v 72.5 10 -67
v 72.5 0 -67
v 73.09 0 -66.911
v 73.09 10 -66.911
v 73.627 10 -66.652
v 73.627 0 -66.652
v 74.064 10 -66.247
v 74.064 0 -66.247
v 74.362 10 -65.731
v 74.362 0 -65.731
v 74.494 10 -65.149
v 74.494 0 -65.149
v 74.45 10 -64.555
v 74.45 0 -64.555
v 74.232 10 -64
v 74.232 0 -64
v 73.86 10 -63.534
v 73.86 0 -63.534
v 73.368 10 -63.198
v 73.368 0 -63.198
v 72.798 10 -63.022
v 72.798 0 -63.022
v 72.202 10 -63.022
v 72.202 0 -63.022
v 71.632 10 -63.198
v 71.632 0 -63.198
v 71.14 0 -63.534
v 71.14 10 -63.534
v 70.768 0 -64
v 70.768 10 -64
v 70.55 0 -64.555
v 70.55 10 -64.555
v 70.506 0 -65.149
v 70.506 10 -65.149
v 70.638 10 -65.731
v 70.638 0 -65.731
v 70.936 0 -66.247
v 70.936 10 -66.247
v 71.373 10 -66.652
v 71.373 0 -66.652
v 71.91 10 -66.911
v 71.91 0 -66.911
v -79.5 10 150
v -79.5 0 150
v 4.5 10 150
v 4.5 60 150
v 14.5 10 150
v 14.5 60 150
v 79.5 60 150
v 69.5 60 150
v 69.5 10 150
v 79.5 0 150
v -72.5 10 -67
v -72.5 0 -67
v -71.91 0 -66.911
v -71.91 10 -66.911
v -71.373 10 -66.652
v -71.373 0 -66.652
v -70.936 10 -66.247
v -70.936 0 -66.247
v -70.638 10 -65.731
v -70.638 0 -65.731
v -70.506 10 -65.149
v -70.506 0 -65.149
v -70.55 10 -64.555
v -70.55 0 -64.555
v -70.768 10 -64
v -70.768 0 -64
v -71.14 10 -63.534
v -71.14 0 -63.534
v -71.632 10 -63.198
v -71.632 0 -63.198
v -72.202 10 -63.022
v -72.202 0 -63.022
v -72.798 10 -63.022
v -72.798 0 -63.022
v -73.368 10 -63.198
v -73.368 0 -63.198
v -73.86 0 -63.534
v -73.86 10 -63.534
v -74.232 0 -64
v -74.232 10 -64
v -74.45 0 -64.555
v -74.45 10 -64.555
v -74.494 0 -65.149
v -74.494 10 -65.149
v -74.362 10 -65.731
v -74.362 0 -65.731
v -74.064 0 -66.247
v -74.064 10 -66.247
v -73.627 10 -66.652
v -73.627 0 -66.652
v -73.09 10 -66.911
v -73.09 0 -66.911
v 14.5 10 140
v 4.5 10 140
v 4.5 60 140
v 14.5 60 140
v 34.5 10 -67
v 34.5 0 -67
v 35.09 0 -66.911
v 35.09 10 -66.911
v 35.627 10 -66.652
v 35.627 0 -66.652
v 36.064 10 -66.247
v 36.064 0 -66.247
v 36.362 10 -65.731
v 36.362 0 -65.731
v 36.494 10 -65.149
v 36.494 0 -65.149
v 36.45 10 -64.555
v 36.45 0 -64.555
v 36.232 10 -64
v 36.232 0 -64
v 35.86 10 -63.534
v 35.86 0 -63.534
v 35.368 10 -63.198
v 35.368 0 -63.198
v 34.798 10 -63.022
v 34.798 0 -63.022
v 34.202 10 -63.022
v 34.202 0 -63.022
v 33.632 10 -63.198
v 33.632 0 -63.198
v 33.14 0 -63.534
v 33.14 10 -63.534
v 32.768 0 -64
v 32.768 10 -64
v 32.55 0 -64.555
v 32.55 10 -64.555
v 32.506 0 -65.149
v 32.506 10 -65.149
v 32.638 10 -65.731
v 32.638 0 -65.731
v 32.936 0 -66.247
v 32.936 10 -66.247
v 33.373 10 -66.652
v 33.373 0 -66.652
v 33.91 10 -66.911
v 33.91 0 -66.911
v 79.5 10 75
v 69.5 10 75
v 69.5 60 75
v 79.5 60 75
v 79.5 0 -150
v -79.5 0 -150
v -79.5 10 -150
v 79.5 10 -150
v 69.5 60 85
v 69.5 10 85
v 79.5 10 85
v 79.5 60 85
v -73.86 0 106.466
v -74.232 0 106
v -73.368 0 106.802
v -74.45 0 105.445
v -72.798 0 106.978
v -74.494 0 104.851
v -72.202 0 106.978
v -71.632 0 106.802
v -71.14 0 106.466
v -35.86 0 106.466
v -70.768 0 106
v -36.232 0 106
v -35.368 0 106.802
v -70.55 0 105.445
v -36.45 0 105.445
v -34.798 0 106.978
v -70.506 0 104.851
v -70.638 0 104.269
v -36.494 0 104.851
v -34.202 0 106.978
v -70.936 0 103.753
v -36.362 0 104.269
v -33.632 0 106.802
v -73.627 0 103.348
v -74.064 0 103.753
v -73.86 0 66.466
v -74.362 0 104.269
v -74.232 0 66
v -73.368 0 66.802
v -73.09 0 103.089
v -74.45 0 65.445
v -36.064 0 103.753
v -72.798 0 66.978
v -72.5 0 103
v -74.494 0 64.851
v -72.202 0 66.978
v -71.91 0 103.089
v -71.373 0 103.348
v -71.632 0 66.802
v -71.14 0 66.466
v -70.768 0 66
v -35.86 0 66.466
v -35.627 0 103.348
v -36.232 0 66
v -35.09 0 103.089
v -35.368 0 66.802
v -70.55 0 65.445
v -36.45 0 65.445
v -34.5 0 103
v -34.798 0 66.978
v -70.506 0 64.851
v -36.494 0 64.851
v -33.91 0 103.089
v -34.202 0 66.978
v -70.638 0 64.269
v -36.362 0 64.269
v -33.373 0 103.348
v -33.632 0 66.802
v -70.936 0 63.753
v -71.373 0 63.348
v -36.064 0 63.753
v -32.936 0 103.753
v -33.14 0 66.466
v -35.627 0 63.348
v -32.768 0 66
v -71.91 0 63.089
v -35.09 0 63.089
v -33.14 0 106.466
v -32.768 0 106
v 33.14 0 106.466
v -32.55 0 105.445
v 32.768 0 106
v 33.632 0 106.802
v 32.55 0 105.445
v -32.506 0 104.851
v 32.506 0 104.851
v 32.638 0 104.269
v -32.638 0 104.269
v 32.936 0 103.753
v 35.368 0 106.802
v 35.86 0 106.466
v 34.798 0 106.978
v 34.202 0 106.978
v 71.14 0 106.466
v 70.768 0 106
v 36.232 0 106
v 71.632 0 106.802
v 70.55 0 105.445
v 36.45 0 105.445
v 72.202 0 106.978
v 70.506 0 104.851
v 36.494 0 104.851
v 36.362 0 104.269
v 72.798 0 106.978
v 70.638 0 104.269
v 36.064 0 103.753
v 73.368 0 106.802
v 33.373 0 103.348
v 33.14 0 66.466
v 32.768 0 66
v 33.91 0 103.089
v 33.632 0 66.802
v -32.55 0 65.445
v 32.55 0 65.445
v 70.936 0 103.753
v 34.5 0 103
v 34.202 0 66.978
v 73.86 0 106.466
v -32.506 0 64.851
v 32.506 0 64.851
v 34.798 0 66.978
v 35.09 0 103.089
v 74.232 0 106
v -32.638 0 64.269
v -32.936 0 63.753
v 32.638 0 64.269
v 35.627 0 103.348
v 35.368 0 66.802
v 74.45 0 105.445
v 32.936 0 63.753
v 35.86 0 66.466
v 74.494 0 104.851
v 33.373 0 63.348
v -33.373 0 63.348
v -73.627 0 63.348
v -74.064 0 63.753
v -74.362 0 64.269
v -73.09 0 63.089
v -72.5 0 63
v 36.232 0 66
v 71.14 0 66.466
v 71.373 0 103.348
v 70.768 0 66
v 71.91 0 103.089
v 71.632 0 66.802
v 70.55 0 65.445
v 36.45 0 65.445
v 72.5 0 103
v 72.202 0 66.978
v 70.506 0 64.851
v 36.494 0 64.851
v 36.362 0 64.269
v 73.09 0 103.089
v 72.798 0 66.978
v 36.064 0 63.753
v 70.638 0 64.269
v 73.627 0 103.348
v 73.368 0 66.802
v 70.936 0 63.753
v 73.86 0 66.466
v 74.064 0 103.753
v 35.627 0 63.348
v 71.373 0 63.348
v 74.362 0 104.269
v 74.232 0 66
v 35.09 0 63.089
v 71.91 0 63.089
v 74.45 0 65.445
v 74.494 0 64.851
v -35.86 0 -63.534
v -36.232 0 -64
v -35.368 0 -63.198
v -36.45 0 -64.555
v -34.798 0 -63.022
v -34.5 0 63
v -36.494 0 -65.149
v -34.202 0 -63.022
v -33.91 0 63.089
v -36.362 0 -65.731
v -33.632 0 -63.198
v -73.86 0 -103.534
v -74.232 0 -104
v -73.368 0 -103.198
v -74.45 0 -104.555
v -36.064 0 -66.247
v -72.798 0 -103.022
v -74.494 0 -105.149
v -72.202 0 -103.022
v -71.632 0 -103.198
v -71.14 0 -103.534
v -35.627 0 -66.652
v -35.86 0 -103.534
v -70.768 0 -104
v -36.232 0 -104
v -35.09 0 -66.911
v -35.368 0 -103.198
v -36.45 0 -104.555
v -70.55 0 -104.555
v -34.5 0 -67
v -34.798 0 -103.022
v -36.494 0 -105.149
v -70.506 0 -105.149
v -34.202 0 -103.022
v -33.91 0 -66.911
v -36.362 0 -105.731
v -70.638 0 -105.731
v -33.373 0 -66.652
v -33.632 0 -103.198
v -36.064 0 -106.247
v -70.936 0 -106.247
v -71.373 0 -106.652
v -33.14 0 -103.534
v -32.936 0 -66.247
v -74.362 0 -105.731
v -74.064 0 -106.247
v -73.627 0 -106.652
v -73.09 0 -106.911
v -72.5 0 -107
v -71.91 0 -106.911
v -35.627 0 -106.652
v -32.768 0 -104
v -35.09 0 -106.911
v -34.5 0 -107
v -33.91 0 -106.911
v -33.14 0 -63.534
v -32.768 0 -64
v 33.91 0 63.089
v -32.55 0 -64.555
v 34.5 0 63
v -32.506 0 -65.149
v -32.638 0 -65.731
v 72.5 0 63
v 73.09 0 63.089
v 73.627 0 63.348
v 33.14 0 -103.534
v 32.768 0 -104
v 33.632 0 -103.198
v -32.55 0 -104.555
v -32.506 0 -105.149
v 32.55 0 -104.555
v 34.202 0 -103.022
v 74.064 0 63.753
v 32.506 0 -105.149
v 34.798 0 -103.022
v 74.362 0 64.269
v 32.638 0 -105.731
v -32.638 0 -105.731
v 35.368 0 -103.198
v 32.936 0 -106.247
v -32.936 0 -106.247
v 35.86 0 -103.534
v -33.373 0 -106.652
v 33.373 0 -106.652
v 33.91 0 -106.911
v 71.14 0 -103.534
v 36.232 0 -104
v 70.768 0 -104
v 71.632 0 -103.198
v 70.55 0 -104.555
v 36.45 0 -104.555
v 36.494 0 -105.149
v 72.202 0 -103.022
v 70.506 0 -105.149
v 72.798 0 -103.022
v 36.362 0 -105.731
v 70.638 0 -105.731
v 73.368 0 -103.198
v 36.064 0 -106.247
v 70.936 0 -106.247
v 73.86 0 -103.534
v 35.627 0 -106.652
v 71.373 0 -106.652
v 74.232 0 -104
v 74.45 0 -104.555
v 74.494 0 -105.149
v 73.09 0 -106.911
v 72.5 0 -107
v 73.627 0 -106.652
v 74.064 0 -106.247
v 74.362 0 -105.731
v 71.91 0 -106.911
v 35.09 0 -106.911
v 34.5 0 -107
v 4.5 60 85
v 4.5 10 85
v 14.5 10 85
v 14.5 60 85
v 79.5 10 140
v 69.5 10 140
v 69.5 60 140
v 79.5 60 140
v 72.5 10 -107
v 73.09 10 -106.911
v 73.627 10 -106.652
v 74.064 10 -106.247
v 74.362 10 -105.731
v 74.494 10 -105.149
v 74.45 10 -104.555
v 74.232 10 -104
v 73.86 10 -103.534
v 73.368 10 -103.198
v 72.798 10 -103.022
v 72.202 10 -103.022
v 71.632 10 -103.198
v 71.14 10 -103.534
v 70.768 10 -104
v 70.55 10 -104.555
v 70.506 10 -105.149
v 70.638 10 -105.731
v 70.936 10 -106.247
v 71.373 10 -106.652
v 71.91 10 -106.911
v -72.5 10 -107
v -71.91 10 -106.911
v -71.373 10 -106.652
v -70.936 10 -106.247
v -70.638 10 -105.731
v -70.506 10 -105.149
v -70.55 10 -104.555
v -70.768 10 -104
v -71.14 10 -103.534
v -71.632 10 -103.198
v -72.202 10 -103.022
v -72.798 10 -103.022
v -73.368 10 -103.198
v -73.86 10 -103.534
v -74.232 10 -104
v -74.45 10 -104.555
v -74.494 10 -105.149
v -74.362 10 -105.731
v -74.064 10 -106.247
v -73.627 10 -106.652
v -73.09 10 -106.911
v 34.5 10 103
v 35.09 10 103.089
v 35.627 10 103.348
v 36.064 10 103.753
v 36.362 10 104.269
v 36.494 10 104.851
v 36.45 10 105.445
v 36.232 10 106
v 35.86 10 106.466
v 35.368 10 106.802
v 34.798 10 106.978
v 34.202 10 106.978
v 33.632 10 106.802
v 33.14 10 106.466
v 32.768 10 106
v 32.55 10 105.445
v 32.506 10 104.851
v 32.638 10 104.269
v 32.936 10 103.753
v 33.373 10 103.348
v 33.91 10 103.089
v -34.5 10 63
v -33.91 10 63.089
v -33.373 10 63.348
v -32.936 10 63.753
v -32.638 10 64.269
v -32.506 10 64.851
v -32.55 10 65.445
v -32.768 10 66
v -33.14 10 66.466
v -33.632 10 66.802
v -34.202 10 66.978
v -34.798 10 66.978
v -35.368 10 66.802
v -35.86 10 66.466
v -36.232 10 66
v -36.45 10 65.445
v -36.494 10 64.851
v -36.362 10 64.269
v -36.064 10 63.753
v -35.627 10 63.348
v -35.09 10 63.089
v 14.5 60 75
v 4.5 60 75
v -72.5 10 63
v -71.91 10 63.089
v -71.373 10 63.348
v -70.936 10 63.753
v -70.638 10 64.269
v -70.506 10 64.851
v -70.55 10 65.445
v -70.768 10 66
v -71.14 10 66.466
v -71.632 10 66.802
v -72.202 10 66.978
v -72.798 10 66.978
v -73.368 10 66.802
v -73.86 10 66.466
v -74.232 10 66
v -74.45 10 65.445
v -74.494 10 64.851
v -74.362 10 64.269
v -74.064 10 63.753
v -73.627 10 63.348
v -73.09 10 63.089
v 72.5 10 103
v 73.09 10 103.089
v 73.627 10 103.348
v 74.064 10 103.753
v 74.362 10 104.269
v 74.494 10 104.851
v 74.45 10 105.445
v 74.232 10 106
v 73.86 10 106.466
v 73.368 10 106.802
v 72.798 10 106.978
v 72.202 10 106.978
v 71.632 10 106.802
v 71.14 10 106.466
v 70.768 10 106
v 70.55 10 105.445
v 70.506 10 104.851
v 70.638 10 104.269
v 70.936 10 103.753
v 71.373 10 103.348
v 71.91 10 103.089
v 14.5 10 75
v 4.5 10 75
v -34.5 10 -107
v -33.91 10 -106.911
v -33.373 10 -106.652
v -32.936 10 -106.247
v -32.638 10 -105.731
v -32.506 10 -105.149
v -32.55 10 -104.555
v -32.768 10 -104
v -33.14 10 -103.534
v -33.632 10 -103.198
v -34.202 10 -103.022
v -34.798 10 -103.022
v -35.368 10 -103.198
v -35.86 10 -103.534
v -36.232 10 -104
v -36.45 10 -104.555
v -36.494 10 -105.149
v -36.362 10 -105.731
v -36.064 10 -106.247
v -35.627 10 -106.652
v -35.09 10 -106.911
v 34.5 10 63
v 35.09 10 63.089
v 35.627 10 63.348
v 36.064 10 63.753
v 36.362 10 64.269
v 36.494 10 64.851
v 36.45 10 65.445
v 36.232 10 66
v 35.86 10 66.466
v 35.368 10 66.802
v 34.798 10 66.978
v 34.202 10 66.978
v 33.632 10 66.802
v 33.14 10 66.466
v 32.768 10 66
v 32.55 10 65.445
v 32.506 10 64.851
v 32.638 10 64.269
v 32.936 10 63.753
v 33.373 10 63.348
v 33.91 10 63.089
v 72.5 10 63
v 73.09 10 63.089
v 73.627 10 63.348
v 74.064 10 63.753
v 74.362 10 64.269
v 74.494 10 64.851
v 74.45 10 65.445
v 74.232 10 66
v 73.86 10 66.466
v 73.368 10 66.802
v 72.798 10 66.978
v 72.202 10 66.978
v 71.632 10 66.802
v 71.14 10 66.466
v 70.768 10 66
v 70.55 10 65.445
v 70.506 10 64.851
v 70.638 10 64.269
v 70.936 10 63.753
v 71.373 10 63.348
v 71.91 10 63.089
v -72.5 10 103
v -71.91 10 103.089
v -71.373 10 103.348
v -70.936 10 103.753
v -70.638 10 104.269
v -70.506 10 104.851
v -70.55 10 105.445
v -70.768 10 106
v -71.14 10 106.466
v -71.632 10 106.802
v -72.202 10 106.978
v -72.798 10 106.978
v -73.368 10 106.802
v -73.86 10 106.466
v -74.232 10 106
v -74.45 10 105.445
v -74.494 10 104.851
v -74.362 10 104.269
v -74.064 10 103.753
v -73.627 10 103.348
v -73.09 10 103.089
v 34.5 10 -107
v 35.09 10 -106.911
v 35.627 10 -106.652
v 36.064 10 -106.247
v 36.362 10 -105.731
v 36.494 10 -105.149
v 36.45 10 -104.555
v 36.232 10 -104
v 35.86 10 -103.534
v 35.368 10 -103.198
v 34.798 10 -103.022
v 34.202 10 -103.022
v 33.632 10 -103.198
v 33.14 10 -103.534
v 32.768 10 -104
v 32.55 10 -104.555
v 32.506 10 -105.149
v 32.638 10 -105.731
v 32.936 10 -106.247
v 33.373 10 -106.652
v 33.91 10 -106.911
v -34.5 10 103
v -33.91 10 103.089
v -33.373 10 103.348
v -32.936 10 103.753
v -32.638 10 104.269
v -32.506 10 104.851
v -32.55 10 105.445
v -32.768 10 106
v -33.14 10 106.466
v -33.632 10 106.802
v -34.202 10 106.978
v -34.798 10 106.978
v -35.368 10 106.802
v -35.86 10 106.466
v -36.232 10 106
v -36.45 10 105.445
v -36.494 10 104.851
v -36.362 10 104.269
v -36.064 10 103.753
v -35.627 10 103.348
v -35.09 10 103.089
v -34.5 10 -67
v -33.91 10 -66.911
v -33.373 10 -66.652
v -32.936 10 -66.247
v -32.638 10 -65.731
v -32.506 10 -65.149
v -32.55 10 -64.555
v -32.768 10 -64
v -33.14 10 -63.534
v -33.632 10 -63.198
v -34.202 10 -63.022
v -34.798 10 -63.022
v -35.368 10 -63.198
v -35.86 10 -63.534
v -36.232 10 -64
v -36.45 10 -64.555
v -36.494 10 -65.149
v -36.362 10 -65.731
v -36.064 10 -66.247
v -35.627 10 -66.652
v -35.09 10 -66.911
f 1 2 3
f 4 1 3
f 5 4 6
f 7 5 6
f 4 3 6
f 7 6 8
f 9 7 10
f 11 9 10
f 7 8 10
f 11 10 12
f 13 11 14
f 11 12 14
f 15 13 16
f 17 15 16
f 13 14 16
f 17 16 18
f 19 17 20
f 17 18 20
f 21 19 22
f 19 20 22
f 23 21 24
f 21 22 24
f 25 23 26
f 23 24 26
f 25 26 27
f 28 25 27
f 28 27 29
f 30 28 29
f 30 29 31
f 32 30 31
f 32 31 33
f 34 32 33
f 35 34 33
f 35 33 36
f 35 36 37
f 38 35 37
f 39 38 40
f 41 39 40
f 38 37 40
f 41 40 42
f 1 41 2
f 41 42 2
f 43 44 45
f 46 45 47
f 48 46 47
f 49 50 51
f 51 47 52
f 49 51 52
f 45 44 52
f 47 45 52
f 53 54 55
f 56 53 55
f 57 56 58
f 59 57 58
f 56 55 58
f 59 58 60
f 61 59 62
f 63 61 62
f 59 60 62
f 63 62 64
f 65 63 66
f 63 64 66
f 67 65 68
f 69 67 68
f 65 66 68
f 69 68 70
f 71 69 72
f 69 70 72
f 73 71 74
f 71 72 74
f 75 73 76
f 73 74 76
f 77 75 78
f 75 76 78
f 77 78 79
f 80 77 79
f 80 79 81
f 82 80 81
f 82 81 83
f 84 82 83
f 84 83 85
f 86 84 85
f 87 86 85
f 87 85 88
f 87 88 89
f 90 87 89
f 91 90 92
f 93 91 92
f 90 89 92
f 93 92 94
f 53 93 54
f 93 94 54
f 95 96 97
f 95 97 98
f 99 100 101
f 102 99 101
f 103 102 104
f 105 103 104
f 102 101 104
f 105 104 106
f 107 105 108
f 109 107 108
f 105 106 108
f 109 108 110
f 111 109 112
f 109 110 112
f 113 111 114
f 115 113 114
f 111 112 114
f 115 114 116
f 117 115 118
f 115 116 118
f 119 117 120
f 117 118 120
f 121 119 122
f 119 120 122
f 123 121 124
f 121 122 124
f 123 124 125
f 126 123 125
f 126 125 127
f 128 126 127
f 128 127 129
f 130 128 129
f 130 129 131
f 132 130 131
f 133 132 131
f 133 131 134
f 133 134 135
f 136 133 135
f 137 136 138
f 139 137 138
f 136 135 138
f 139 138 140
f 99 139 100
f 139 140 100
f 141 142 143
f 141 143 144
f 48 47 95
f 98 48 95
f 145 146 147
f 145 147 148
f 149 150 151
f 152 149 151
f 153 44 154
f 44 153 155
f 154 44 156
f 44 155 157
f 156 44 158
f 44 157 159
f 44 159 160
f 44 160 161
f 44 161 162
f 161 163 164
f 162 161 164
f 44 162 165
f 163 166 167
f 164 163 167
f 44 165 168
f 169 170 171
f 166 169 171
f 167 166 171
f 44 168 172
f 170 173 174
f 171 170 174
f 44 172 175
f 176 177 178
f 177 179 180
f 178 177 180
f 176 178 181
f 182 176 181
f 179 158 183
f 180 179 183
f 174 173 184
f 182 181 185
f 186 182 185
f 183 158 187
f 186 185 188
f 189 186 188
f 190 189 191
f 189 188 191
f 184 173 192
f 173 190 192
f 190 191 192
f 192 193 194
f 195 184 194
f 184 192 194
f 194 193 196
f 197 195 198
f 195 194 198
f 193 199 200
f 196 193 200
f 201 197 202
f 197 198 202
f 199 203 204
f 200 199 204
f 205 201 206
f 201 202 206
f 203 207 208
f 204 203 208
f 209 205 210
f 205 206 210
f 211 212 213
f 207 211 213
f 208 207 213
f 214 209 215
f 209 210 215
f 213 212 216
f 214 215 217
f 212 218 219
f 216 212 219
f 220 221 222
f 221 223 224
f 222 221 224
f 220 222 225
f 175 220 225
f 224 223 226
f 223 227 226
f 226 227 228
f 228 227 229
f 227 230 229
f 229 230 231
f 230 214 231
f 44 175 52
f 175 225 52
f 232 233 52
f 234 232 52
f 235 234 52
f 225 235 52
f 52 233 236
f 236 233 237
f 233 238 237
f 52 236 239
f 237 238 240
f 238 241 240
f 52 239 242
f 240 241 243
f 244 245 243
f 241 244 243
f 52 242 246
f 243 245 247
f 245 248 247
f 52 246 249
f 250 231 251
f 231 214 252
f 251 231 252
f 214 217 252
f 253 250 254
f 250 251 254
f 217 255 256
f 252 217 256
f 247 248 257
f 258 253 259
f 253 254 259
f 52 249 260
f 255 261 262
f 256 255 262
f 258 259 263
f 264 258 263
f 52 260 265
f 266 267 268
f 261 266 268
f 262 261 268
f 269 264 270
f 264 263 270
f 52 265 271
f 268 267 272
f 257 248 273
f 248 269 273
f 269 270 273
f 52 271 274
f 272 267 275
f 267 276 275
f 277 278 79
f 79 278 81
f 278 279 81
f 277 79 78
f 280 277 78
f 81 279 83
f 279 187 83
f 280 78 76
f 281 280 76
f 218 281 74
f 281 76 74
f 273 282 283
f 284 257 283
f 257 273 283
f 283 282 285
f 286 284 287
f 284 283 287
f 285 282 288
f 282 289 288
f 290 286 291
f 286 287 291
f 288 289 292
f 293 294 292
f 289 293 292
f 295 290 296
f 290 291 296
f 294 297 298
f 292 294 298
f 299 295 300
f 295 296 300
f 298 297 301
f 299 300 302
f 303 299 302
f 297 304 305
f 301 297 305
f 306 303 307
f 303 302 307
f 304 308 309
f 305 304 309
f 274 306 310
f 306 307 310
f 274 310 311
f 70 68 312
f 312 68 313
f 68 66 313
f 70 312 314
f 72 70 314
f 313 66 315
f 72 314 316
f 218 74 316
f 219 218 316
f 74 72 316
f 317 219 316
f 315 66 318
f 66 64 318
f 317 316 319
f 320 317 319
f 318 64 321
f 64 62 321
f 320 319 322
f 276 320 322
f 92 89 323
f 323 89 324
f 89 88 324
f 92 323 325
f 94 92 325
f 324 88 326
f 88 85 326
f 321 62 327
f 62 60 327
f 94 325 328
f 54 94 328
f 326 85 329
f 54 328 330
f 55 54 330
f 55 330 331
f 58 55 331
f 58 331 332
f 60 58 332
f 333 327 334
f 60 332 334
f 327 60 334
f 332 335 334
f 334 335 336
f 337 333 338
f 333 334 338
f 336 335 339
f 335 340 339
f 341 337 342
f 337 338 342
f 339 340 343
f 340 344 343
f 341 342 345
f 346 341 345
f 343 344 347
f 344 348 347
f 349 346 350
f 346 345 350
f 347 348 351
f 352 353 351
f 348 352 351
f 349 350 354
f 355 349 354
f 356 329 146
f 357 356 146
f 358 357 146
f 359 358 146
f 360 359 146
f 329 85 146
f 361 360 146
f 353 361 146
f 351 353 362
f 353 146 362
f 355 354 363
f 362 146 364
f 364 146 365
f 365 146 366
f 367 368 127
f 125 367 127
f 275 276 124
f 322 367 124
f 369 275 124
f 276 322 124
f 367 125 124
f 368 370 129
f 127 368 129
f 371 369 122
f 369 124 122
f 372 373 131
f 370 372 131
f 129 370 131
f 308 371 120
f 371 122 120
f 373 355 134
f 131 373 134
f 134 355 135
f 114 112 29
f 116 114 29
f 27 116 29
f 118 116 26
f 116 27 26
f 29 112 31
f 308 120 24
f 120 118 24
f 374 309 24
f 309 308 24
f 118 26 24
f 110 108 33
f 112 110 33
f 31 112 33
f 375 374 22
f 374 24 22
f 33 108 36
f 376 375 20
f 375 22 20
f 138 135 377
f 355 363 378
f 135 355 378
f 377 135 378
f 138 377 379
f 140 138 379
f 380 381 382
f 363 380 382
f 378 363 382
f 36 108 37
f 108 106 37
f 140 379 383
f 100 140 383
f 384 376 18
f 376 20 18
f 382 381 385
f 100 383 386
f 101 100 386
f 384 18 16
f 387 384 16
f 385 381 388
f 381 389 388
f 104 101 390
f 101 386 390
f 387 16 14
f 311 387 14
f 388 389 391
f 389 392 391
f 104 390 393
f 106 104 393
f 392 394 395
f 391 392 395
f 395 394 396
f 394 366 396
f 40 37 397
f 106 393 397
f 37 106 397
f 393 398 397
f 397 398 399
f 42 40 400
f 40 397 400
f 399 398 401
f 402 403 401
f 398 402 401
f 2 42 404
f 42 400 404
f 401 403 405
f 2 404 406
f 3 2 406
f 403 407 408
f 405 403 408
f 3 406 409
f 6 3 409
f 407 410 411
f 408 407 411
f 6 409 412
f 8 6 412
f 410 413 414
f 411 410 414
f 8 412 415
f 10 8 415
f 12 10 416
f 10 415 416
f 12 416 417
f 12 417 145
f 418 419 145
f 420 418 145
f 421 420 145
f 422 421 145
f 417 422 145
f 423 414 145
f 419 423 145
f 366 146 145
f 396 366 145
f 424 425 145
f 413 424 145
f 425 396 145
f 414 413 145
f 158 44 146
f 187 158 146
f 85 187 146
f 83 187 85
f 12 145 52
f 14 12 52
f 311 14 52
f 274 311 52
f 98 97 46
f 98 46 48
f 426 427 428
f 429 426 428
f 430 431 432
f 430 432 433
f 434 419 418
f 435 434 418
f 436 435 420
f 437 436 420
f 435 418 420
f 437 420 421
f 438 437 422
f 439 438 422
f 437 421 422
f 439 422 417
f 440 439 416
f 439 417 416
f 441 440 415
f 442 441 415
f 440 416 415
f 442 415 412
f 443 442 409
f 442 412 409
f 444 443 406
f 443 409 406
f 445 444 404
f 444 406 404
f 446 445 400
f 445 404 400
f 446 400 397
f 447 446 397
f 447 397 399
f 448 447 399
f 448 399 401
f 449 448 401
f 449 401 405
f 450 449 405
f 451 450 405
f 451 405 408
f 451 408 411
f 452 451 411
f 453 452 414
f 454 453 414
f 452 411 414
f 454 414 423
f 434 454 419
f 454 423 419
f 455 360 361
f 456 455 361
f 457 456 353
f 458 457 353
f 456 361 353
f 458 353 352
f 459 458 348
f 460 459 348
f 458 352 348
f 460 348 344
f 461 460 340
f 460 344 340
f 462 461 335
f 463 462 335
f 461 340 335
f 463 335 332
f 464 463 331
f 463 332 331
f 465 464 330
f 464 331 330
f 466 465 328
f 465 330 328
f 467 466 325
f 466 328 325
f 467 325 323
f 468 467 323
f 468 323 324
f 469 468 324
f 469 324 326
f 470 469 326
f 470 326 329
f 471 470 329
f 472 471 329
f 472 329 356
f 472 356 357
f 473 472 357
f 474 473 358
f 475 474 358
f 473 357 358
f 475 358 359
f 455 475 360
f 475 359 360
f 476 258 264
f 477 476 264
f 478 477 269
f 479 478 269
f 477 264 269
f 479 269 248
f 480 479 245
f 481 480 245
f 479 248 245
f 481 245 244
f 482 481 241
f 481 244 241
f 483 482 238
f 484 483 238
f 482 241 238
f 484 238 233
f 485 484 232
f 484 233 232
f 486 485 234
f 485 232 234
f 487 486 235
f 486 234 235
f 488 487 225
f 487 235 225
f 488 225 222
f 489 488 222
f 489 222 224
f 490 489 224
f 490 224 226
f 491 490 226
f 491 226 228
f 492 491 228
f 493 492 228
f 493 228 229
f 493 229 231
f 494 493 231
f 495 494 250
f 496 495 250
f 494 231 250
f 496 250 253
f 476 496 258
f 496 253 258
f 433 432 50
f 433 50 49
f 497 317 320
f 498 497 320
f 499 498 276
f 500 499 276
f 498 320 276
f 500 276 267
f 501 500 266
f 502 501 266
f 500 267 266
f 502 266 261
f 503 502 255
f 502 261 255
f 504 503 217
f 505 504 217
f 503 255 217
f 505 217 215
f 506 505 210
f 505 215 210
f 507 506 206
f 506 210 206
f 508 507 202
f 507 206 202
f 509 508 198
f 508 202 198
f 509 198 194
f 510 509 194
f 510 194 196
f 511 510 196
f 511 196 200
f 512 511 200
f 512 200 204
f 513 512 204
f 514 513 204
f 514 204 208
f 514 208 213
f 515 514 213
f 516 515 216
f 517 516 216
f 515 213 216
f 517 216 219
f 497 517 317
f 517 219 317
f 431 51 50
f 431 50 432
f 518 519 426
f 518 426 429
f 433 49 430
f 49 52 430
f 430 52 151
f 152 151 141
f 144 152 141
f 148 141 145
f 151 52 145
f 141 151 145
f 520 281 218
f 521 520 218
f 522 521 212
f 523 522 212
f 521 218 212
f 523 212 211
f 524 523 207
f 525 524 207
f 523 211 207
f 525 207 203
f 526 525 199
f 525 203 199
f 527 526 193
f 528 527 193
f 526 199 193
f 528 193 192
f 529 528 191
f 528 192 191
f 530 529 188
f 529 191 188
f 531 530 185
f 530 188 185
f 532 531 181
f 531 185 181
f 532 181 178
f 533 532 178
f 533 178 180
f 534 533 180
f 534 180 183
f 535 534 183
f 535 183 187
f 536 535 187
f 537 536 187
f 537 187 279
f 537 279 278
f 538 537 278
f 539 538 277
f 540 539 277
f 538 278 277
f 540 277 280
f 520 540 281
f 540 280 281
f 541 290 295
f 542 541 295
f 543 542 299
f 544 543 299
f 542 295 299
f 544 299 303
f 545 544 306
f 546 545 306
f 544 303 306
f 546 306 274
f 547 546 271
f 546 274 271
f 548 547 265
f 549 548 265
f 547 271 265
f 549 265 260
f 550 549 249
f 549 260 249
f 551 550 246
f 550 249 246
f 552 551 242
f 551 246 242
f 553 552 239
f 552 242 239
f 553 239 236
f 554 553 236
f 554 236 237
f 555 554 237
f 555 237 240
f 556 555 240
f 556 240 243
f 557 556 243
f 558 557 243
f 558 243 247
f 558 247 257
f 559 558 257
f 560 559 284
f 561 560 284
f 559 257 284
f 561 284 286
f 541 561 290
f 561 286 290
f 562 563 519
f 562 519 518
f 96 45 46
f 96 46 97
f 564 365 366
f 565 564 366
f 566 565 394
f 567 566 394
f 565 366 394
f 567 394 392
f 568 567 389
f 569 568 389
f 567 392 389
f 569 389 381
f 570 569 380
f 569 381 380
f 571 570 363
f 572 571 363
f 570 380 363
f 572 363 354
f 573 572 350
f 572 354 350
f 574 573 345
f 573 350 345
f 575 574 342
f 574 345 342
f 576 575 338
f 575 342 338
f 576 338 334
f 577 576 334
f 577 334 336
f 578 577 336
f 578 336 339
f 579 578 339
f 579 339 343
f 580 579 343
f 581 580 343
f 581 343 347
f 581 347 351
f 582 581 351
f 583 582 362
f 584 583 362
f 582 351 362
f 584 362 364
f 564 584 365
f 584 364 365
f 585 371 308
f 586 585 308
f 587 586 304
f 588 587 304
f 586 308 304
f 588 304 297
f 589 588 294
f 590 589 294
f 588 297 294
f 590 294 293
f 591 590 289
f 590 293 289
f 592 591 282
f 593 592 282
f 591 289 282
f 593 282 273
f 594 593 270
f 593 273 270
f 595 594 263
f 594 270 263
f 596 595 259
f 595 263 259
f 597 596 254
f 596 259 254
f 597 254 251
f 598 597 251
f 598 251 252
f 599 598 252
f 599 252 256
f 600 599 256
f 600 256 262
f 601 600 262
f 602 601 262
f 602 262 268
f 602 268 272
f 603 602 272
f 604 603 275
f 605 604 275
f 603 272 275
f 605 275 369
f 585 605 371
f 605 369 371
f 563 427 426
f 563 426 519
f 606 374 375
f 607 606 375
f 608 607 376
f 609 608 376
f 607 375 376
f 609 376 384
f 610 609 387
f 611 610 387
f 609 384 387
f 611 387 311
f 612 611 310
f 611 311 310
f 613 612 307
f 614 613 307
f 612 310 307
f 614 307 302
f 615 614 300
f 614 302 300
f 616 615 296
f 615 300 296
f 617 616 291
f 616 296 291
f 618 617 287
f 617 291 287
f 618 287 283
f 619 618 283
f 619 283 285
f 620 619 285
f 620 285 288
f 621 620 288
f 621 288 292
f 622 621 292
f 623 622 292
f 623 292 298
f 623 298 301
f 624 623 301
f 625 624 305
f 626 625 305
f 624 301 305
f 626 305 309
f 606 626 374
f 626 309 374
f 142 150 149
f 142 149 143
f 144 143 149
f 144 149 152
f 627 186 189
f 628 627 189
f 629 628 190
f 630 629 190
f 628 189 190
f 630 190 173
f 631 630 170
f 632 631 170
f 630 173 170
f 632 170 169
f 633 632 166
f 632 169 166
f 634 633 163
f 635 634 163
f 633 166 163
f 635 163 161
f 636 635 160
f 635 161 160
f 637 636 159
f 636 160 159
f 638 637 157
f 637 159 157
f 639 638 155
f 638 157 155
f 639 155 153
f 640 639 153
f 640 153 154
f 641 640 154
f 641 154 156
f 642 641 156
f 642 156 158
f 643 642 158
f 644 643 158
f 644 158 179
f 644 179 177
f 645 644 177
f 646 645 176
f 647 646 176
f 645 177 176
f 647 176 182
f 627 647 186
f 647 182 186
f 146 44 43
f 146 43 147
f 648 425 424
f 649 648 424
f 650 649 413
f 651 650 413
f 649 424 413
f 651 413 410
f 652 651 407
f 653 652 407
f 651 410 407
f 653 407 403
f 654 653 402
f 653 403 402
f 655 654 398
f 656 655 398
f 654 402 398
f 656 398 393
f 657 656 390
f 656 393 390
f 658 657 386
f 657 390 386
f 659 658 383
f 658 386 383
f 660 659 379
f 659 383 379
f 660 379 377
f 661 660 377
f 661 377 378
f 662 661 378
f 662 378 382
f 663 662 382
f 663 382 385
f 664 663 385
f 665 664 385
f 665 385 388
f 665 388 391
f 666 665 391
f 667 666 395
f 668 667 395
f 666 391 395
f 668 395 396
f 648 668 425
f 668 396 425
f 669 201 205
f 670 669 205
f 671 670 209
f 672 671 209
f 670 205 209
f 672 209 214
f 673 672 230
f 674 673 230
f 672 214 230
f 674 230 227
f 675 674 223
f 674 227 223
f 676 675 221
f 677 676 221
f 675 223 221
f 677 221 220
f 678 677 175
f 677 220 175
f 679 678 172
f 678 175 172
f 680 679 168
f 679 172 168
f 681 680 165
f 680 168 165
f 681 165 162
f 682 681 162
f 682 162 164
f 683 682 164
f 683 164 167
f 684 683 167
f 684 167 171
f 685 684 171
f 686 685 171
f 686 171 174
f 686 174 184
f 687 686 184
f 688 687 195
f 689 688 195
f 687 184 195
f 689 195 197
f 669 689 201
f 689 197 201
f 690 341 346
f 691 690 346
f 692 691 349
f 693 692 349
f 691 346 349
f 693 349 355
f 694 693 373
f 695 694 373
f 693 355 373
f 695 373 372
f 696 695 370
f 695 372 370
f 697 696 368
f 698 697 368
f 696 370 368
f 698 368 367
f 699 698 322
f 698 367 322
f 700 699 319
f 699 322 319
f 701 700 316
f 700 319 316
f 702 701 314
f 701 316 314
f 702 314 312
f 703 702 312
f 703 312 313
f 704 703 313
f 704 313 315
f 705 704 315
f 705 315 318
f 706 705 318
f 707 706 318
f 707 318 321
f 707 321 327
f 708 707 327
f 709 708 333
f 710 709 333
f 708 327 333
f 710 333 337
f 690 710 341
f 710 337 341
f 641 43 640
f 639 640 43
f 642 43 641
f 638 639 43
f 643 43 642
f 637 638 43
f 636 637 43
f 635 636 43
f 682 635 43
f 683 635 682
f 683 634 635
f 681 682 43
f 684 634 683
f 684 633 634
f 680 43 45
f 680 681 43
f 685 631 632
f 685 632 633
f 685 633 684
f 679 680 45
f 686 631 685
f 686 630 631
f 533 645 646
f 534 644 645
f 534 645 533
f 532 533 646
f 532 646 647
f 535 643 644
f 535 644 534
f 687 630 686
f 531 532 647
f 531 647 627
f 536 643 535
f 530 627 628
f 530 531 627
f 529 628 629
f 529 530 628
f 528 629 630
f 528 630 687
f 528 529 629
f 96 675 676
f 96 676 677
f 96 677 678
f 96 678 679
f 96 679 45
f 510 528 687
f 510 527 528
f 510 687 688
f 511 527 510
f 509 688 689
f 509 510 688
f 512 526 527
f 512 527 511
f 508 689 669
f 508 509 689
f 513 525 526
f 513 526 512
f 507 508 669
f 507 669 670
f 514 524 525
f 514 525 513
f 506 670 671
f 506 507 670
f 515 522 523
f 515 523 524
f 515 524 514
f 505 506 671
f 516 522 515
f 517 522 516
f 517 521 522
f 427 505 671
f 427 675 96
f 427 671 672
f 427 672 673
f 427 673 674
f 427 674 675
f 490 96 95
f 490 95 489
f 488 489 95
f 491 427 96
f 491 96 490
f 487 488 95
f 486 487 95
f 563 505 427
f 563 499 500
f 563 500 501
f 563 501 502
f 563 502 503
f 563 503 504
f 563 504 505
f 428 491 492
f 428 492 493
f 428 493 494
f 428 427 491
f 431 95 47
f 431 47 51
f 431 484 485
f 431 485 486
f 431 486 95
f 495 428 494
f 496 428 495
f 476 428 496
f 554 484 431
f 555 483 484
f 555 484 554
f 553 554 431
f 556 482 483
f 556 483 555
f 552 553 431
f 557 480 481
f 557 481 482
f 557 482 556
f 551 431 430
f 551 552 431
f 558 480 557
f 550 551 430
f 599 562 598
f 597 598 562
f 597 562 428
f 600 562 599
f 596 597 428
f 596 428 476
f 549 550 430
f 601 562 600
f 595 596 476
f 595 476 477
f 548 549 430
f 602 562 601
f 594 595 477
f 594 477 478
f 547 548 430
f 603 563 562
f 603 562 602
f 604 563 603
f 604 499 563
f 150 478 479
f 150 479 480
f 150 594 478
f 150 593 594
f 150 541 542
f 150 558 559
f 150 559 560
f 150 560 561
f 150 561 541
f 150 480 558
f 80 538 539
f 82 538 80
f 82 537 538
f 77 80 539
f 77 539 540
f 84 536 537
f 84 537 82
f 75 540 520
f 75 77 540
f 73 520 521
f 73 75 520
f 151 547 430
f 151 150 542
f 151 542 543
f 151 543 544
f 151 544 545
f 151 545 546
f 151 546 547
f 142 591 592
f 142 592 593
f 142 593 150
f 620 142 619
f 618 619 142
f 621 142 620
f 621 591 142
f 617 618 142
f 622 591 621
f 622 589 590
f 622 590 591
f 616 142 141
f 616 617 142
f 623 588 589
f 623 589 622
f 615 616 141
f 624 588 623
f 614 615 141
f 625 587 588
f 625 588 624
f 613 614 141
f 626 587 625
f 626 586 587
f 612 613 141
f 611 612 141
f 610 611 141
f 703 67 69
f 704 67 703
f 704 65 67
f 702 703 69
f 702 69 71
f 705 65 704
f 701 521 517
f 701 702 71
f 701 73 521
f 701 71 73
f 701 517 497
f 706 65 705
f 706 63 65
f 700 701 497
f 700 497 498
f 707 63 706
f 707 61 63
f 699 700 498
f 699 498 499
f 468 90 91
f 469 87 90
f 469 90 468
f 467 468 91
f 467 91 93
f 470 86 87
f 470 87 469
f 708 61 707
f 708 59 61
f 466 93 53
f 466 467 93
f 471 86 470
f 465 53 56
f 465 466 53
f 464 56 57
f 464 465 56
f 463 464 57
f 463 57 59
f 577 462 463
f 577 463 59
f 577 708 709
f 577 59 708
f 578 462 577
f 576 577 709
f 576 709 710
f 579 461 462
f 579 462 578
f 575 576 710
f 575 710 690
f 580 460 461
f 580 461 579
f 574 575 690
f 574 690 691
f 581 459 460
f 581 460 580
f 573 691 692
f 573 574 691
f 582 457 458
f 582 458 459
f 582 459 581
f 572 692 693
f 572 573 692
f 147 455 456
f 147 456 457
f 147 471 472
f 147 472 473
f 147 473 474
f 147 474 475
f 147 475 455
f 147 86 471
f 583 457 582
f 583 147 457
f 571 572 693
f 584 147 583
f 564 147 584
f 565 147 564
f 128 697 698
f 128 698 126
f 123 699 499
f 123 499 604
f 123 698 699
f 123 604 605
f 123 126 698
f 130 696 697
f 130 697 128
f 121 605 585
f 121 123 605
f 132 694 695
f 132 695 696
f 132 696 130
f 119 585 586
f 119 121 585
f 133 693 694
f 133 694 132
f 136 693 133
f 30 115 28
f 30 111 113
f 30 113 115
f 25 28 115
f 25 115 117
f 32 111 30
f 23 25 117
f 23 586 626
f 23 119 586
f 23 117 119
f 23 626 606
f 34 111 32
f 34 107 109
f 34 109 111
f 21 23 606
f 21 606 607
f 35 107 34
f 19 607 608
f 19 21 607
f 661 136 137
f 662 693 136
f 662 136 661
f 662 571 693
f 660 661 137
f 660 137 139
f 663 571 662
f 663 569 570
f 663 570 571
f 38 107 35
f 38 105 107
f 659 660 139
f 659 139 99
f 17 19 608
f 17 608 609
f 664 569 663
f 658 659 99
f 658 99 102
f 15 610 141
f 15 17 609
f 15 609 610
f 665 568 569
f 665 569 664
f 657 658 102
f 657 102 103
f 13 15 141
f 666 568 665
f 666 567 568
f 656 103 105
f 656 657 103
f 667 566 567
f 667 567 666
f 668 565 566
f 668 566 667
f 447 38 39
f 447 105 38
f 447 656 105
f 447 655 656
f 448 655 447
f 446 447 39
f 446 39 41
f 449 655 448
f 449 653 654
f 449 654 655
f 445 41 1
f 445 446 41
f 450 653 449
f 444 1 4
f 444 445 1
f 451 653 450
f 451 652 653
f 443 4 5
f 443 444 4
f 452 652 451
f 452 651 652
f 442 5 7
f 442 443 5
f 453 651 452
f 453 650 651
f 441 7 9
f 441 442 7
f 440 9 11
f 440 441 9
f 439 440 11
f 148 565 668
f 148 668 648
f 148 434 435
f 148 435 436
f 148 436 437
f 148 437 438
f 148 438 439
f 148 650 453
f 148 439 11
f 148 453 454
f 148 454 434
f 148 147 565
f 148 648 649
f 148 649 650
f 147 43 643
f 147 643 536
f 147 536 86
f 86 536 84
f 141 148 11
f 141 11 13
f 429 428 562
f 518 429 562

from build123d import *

# Parameters (mm, degrees)
SKETCH3_W           = 159
SKETCH3_H           = 300
BOSS_EXTRUDE1_DEPTH = 10
SKETCH4_W           = 10
SKETCH4_H           = 10
BOSS_EXTRUDE2_DEPTH = 50
SKETCH7_R           = 2
SKETCH7_R_2         = 2.000000006
SKETCH7_R_3         = 1.999999994
CUT_EXTRUDE2_DEPTH  = 10


with BuildPart() as part:
    # Sketch3 → Boss-Extrude1 (new body)
    with BuildSketch(Plane(origin=(0, 0, 0), x_dir=(1, 0, 0), z_dir=(0, 1, 0))):
        Rectangle(SKETCH3_W, SKETCH3_H)
    extrude(amount=BOSS_EXTRUDE1_DEPTH)

    # Sketch4 → Boss-Extrude2 (add)
    with BuildSketch(Plane(origin=(0, 10, 0), x_dir=(1, 0, 0), z_dir=(0, 1, 0))):
        with Locations((74.5, -145)):
            Rectangle(SKETCH4_W, SKETCH4_H)
        with Locations((74.5, -80)):
            Rectangle(SKETCH4_W, SKETCH4_H)
        with Locations((9.5, -145)):
            Rectangle(SKETCH4_W, SKETCH4_H)
        with Locations((9.5, -80)):
            Rectangle(SKETCH4_W, SKETCH4_H)
    extrude(amount=BOSS_EXTRUDE2_DEPTH)

    # Sketch7 → Cut-Extrude2 (cut)
    with BuildSketch(Plane.XZ):
        with Locations(Location((34.5, -105, 0), (0, 0, 270))):
            Circle(SKETCH7_R)
        with Locations(Location((72.5, -105, 0), (0, 0, 270))):
            Circle(SKETCH7_R)
        with Locations(Location((72.5, -65, 0), (0, 0, 270))):
            Circle(SKETCH7_R)
        with Locations(Location((34.5, -65, 0), (0, 0, 270))):
            Circle(SKETCH7_R)
        with Locations(Location((-34.5, -65, 0), (0, 0, 270))):
            Circle(SKETCH7_R)
        with Locations(Location((-72.5, -65, 0), (0, 0, 270))):
            Circle(SKETCH7_R)
        with Locations(Location((-34.5, -105, 0), (0, 0, 270))):
            Circle(SKETCH7_R)
        with Locations(Location((-72.5, -105, 0), (0, 0, 270))):
            Circle(SKETCH7_R)
        with Locations(Location((-72.5, 65, 0), (0, 0, 270))):
            Circle(SKETCH7_R)
        with Locations(Location((-72.5, 105, 0), (0, 0, 270))):
            Circle(SKETCH7_R)
        with Locations(Location((-34.5, 105, 0), (0, 0, 270))):
            Circle(SKETCH7_R_2)
        with Locations(Location((-34.5, 65, 0), (0, 0, 270))):
            Circle(SKETCH7_R)
        with Locations(Location((34.5, 105, 0), (0, 0, 270))):
            Circle(SKETCH7_R_3)
        with Locations(Location((72.5, 105, 0), (0, 0, 270))):
            Circle(SKETCH7_R)
        with Locations(Location((72.5, 65, 0), (0, 0, 270))):
            Circle(SKETCH7_R)
        with Locations(Location((34.5, 65, 0), (0, 0, 270))):
            Circle(SKETCH7_R)
    extrude(amount=-CUT_EXTRUDE2_DEPTH, mode=Mode.SUBTRACT)


solid = part.part
